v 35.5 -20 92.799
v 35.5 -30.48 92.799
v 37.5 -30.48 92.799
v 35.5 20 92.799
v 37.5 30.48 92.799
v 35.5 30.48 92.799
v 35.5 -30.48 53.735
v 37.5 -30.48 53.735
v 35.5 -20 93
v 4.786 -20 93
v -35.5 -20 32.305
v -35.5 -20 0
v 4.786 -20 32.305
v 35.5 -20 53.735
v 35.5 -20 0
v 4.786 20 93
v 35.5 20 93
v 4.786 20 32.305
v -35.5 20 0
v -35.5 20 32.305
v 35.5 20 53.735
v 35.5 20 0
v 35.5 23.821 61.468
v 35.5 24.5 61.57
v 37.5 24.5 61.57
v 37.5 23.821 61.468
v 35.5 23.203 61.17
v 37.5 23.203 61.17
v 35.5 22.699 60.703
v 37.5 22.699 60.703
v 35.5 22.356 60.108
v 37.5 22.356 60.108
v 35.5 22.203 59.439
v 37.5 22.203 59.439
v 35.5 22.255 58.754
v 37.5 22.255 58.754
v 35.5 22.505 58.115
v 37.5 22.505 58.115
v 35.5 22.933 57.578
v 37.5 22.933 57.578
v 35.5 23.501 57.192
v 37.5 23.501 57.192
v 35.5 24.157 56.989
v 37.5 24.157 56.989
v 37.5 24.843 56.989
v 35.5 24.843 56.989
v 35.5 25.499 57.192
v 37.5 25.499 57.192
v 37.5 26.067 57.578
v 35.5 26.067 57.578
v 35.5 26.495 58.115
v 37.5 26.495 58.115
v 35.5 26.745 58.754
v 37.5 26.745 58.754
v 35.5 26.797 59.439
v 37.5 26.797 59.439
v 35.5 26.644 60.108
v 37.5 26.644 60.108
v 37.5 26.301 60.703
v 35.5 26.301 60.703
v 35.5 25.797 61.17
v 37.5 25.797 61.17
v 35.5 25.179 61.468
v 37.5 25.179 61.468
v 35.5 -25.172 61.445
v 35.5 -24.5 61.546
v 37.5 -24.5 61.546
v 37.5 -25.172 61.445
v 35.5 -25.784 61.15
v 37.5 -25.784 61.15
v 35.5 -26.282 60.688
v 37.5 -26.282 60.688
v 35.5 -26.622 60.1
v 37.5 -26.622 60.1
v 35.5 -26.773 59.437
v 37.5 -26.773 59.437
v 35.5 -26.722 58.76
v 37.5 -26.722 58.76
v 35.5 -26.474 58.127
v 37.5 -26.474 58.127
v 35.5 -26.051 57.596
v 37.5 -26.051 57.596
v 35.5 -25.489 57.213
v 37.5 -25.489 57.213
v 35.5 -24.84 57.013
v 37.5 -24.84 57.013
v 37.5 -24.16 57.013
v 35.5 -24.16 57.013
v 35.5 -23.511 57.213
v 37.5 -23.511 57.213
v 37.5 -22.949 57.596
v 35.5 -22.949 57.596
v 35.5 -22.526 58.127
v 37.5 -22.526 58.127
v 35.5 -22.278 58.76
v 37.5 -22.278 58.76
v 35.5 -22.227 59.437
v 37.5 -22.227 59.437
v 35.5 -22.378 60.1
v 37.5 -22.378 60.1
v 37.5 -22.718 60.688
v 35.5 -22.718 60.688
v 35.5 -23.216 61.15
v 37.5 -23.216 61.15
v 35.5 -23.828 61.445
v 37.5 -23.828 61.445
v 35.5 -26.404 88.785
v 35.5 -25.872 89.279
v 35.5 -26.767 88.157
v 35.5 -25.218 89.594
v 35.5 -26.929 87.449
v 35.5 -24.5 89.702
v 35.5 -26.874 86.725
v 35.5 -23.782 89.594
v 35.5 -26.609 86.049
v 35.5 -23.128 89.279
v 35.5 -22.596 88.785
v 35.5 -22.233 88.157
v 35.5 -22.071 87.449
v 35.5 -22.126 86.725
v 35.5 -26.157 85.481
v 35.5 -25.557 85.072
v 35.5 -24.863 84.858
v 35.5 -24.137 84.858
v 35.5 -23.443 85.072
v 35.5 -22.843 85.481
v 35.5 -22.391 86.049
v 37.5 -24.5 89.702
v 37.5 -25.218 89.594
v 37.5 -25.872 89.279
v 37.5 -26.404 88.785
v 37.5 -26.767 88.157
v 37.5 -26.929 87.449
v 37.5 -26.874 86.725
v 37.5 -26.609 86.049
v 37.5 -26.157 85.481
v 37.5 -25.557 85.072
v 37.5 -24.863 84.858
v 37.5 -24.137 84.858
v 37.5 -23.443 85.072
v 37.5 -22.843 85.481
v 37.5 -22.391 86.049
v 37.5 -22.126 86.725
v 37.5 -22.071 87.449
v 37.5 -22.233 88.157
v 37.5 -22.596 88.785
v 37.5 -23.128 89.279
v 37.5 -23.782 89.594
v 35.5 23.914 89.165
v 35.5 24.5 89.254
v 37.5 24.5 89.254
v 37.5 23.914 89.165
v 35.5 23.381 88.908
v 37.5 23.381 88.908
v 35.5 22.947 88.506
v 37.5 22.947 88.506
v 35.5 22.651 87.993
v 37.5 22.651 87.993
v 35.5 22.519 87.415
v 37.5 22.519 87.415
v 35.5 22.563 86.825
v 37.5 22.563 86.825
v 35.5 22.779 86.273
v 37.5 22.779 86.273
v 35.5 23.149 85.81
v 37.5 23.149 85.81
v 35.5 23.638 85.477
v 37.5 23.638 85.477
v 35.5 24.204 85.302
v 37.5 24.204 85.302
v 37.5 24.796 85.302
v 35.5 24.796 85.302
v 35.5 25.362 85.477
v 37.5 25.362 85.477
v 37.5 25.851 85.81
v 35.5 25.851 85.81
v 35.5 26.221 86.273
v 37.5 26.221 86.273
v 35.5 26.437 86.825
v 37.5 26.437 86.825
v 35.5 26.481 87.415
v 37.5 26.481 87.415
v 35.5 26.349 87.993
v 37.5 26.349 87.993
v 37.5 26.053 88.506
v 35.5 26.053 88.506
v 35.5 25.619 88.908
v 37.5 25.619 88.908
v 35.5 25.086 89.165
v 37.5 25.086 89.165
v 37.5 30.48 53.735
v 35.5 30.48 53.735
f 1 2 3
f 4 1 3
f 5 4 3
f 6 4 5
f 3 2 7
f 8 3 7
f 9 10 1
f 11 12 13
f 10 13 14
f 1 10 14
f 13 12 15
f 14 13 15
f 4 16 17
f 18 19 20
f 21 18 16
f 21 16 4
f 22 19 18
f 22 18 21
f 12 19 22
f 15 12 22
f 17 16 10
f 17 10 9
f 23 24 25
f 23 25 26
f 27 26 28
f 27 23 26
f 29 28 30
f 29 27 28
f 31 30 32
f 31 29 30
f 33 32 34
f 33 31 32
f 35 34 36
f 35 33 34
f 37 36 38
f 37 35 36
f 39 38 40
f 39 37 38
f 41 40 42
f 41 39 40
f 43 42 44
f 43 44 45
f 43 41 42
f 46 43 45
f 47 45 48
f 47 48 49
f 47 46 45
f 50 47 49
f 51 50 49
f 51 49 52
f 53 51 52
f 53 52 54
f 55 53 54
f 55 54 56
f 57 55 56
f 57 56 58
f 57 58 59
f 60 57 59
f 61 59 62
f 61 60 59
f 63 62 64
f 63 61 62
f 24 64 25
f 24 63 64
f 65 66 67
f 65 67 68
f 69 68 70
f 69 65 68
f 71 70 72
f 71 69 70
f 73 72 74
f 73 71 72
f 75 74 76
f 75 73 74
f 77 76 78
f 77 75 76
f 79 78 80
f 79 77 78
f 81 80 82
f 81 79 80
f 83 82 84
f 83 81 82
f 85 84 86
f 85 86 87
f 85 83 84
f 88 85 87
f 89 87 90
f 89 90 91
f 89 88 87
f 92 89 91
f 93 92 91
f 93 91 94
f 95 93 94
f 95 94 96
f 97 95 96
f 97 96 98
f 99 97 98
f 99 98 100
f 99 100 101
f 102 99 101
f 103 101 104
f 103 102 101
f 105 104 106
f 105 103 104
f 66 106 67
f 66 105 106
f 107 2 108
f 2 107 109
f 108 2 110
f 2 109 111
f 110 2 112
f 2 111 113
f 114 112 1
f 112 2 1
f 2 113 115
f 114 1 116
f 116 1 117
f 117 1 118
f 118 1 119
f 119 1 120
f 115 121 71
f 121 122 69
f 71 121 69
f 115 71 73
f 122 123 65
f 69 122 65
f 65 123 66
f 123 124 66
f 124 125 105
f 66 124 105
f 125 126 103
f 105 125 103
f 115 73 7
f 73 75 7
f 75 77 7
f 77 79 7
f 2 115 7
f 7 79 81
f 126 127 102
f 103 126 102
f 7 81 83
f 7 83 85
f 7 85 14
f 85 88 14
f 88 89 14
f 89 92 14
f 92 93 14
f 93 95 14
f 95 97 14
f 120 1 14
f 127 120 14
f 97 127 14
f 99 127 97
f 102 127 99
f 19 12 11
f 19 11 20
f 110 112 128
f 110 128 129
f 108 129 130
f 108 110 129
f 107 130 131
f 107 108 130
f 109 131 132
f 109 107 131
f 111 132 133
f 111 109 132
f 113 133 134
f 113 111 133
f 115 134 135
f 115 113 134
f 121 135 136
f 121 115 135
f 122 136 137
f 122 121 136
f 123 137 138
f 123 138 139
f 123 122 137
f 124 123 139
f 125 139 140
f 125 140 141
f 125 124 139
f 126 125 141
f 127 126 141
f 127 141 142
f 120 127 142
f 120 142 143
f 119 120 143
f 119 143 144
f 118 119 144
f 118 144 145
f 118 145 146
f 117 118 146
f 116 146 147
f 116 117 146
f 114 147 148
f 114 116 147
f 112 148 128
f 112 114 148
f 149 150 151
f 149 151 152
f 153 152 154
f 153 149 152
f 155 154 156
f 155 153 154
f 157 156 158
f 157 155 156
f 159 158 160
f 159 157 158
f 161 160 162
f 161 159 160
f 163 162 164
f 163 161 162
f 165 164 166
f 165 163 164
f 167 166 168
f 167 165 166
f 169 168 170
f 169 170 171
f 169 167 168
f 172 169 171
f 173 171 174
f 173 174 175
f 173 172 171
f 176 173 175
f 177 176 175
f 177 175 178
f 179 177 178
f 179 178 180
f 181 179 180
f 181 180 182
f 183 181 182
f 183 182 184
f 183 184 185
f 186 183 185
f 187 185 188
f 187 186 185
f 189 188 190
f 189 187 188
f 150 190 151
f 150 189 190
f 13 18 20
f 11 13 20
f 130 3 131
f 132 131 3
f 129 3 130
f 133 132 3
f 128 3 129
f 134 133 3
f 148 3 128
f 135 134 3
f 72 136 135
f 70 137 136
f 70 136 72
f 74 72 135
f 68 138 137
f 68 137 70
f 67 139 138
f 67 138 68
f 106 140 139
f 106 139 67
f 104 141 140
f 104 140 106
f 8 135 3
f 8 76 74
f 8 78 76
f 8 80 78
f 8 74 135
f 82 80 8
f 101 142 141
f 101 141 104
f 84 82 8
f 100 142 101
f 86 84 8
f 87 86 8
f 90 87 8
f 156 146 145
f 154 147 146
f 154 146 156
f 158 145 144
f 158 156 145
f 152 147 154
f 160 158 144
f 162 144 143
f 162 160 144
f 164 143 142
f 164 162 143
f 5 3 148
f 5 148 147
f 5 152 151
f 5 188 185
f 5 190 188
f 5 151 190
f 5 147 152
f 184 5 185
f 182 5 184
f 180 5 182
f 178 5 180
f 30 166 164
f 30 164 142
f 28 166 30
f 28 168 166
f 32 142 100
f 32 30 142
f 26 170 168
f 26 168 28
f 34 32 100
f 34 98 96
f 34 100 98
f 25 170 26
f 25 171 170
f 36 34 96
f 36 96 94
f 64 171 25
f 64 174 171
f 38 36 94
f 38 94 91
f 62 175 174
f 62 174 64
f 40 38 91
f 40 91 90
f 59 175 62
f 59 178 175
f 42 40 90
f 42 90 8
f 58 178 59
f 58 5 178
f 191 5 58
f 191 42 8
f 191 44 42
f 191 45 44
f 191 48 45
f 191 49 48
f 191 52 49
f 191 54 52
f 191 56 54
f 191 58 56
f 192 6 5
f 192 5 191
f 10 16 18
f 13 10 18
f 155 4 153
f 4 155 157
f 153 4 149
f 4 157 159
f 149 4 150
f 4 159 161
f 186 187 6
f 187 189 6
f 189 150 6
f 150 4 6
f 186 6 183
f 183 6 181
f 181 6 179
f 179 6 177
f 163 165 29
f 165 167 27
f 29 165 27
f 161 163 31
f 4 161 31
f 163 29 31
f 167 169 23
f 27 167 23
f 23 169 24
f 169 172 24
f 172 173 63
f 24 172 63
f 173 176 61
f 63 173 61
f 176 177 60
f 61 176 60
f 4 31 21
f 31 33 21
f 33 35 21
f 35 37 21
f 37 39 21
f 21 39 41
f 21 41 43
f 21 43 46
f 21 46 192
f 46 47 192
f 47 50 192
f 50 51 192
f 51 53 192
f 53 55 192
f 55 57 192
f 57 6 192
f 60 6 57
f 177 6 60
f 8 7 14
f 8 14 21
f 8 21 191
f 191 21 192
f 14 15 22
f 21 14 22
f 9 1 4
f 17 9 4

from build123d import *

# Parameters (mm, degrees)
SKETCH_1_W          = 71
SKETCH_1_H          = 40
EXTRUDE_1_DEPTH     = 93
EXTRUDE_START       = 35.5
SKETCH_2_W          = 39.063966261
SKETCH_2_H          = 60.96055705
SKETCH_2_R          = 1.986807663
SKETCH_2_R_2        = 2.303185406
SKETCH_2_R_3        = 2.435553703
SKETCH_2_R_4        = 2.279586572
EXTRUDE_2_DEPTH     = 2
CUT_EXTRUDE_1_DEPTH = 67


with BuildPart() as part:
    # 草图1 → 凸台-拉伸1 (new body)
    with BuildSketch(Plane.XY):
        Rectangle(SKETCH_1_W, SKETCH_1_H)
    extrude(amount=EXTRUDE_1_DEPTH)

    # 草图2 → 凸台-拉伸2 (add)
    with BuildSketch(Plane(origin=(0, 0, 0), x_dir=(0, 0, -1), z_dir=(1, 0, 0)).offset(EXTRUDE_START)):
        with Locations((-73.266758463, 0)):
            Rectangle(SKETCH_2_W, SKETCH_2_H)
        with Locations(Location((-87.266758464, 24.5, 0), (0, 0, 180))):
            Circle(SKETCH_2_R, mode=Mode.SUBTRACT)
        with Locations(Location((-59.266758464, 24.5, 0), (0, 0, 180))):
            Circle(SKETCH_2_R_2, mode=Mode.SUBTRACT)
        with Locations(Location((-87.266758464, -24.5, 0), (0, 0, 180))):
            Circle(SKETCH_2_R_3, mode=Mode.SUBTRACT)
        with Locations(Location((-59.266758464, -24.5, 0), (0, 0, 180))):
            Circle(SKETCH_2_R_4, mode=Mode.SUBTRACT)
    extrude(amount=EXTRUDE_2_DEPTH)

    # 草图3 → 切除-拉伸1 (cut)
    with BuildSketch(Plane(origin=(0, 20, 0), x_dir=(1, 0, 0), z_dir=(0, 1, 0))):
        Polygon((4.786467803, -93), (4.786467803, -32.304892778), (-35.5, -32.304892778), (-48.137036208, -34.916249884), (-56.319288473, -69.473208918), (-51.935451812, -90.687734689), (-39.693648232, -97.327684713), align=None)
    extrude(amount=-CUT_EXTRUDE_1_DEPTH, mode=Mode.SUBTRACT)


solid = part.part
